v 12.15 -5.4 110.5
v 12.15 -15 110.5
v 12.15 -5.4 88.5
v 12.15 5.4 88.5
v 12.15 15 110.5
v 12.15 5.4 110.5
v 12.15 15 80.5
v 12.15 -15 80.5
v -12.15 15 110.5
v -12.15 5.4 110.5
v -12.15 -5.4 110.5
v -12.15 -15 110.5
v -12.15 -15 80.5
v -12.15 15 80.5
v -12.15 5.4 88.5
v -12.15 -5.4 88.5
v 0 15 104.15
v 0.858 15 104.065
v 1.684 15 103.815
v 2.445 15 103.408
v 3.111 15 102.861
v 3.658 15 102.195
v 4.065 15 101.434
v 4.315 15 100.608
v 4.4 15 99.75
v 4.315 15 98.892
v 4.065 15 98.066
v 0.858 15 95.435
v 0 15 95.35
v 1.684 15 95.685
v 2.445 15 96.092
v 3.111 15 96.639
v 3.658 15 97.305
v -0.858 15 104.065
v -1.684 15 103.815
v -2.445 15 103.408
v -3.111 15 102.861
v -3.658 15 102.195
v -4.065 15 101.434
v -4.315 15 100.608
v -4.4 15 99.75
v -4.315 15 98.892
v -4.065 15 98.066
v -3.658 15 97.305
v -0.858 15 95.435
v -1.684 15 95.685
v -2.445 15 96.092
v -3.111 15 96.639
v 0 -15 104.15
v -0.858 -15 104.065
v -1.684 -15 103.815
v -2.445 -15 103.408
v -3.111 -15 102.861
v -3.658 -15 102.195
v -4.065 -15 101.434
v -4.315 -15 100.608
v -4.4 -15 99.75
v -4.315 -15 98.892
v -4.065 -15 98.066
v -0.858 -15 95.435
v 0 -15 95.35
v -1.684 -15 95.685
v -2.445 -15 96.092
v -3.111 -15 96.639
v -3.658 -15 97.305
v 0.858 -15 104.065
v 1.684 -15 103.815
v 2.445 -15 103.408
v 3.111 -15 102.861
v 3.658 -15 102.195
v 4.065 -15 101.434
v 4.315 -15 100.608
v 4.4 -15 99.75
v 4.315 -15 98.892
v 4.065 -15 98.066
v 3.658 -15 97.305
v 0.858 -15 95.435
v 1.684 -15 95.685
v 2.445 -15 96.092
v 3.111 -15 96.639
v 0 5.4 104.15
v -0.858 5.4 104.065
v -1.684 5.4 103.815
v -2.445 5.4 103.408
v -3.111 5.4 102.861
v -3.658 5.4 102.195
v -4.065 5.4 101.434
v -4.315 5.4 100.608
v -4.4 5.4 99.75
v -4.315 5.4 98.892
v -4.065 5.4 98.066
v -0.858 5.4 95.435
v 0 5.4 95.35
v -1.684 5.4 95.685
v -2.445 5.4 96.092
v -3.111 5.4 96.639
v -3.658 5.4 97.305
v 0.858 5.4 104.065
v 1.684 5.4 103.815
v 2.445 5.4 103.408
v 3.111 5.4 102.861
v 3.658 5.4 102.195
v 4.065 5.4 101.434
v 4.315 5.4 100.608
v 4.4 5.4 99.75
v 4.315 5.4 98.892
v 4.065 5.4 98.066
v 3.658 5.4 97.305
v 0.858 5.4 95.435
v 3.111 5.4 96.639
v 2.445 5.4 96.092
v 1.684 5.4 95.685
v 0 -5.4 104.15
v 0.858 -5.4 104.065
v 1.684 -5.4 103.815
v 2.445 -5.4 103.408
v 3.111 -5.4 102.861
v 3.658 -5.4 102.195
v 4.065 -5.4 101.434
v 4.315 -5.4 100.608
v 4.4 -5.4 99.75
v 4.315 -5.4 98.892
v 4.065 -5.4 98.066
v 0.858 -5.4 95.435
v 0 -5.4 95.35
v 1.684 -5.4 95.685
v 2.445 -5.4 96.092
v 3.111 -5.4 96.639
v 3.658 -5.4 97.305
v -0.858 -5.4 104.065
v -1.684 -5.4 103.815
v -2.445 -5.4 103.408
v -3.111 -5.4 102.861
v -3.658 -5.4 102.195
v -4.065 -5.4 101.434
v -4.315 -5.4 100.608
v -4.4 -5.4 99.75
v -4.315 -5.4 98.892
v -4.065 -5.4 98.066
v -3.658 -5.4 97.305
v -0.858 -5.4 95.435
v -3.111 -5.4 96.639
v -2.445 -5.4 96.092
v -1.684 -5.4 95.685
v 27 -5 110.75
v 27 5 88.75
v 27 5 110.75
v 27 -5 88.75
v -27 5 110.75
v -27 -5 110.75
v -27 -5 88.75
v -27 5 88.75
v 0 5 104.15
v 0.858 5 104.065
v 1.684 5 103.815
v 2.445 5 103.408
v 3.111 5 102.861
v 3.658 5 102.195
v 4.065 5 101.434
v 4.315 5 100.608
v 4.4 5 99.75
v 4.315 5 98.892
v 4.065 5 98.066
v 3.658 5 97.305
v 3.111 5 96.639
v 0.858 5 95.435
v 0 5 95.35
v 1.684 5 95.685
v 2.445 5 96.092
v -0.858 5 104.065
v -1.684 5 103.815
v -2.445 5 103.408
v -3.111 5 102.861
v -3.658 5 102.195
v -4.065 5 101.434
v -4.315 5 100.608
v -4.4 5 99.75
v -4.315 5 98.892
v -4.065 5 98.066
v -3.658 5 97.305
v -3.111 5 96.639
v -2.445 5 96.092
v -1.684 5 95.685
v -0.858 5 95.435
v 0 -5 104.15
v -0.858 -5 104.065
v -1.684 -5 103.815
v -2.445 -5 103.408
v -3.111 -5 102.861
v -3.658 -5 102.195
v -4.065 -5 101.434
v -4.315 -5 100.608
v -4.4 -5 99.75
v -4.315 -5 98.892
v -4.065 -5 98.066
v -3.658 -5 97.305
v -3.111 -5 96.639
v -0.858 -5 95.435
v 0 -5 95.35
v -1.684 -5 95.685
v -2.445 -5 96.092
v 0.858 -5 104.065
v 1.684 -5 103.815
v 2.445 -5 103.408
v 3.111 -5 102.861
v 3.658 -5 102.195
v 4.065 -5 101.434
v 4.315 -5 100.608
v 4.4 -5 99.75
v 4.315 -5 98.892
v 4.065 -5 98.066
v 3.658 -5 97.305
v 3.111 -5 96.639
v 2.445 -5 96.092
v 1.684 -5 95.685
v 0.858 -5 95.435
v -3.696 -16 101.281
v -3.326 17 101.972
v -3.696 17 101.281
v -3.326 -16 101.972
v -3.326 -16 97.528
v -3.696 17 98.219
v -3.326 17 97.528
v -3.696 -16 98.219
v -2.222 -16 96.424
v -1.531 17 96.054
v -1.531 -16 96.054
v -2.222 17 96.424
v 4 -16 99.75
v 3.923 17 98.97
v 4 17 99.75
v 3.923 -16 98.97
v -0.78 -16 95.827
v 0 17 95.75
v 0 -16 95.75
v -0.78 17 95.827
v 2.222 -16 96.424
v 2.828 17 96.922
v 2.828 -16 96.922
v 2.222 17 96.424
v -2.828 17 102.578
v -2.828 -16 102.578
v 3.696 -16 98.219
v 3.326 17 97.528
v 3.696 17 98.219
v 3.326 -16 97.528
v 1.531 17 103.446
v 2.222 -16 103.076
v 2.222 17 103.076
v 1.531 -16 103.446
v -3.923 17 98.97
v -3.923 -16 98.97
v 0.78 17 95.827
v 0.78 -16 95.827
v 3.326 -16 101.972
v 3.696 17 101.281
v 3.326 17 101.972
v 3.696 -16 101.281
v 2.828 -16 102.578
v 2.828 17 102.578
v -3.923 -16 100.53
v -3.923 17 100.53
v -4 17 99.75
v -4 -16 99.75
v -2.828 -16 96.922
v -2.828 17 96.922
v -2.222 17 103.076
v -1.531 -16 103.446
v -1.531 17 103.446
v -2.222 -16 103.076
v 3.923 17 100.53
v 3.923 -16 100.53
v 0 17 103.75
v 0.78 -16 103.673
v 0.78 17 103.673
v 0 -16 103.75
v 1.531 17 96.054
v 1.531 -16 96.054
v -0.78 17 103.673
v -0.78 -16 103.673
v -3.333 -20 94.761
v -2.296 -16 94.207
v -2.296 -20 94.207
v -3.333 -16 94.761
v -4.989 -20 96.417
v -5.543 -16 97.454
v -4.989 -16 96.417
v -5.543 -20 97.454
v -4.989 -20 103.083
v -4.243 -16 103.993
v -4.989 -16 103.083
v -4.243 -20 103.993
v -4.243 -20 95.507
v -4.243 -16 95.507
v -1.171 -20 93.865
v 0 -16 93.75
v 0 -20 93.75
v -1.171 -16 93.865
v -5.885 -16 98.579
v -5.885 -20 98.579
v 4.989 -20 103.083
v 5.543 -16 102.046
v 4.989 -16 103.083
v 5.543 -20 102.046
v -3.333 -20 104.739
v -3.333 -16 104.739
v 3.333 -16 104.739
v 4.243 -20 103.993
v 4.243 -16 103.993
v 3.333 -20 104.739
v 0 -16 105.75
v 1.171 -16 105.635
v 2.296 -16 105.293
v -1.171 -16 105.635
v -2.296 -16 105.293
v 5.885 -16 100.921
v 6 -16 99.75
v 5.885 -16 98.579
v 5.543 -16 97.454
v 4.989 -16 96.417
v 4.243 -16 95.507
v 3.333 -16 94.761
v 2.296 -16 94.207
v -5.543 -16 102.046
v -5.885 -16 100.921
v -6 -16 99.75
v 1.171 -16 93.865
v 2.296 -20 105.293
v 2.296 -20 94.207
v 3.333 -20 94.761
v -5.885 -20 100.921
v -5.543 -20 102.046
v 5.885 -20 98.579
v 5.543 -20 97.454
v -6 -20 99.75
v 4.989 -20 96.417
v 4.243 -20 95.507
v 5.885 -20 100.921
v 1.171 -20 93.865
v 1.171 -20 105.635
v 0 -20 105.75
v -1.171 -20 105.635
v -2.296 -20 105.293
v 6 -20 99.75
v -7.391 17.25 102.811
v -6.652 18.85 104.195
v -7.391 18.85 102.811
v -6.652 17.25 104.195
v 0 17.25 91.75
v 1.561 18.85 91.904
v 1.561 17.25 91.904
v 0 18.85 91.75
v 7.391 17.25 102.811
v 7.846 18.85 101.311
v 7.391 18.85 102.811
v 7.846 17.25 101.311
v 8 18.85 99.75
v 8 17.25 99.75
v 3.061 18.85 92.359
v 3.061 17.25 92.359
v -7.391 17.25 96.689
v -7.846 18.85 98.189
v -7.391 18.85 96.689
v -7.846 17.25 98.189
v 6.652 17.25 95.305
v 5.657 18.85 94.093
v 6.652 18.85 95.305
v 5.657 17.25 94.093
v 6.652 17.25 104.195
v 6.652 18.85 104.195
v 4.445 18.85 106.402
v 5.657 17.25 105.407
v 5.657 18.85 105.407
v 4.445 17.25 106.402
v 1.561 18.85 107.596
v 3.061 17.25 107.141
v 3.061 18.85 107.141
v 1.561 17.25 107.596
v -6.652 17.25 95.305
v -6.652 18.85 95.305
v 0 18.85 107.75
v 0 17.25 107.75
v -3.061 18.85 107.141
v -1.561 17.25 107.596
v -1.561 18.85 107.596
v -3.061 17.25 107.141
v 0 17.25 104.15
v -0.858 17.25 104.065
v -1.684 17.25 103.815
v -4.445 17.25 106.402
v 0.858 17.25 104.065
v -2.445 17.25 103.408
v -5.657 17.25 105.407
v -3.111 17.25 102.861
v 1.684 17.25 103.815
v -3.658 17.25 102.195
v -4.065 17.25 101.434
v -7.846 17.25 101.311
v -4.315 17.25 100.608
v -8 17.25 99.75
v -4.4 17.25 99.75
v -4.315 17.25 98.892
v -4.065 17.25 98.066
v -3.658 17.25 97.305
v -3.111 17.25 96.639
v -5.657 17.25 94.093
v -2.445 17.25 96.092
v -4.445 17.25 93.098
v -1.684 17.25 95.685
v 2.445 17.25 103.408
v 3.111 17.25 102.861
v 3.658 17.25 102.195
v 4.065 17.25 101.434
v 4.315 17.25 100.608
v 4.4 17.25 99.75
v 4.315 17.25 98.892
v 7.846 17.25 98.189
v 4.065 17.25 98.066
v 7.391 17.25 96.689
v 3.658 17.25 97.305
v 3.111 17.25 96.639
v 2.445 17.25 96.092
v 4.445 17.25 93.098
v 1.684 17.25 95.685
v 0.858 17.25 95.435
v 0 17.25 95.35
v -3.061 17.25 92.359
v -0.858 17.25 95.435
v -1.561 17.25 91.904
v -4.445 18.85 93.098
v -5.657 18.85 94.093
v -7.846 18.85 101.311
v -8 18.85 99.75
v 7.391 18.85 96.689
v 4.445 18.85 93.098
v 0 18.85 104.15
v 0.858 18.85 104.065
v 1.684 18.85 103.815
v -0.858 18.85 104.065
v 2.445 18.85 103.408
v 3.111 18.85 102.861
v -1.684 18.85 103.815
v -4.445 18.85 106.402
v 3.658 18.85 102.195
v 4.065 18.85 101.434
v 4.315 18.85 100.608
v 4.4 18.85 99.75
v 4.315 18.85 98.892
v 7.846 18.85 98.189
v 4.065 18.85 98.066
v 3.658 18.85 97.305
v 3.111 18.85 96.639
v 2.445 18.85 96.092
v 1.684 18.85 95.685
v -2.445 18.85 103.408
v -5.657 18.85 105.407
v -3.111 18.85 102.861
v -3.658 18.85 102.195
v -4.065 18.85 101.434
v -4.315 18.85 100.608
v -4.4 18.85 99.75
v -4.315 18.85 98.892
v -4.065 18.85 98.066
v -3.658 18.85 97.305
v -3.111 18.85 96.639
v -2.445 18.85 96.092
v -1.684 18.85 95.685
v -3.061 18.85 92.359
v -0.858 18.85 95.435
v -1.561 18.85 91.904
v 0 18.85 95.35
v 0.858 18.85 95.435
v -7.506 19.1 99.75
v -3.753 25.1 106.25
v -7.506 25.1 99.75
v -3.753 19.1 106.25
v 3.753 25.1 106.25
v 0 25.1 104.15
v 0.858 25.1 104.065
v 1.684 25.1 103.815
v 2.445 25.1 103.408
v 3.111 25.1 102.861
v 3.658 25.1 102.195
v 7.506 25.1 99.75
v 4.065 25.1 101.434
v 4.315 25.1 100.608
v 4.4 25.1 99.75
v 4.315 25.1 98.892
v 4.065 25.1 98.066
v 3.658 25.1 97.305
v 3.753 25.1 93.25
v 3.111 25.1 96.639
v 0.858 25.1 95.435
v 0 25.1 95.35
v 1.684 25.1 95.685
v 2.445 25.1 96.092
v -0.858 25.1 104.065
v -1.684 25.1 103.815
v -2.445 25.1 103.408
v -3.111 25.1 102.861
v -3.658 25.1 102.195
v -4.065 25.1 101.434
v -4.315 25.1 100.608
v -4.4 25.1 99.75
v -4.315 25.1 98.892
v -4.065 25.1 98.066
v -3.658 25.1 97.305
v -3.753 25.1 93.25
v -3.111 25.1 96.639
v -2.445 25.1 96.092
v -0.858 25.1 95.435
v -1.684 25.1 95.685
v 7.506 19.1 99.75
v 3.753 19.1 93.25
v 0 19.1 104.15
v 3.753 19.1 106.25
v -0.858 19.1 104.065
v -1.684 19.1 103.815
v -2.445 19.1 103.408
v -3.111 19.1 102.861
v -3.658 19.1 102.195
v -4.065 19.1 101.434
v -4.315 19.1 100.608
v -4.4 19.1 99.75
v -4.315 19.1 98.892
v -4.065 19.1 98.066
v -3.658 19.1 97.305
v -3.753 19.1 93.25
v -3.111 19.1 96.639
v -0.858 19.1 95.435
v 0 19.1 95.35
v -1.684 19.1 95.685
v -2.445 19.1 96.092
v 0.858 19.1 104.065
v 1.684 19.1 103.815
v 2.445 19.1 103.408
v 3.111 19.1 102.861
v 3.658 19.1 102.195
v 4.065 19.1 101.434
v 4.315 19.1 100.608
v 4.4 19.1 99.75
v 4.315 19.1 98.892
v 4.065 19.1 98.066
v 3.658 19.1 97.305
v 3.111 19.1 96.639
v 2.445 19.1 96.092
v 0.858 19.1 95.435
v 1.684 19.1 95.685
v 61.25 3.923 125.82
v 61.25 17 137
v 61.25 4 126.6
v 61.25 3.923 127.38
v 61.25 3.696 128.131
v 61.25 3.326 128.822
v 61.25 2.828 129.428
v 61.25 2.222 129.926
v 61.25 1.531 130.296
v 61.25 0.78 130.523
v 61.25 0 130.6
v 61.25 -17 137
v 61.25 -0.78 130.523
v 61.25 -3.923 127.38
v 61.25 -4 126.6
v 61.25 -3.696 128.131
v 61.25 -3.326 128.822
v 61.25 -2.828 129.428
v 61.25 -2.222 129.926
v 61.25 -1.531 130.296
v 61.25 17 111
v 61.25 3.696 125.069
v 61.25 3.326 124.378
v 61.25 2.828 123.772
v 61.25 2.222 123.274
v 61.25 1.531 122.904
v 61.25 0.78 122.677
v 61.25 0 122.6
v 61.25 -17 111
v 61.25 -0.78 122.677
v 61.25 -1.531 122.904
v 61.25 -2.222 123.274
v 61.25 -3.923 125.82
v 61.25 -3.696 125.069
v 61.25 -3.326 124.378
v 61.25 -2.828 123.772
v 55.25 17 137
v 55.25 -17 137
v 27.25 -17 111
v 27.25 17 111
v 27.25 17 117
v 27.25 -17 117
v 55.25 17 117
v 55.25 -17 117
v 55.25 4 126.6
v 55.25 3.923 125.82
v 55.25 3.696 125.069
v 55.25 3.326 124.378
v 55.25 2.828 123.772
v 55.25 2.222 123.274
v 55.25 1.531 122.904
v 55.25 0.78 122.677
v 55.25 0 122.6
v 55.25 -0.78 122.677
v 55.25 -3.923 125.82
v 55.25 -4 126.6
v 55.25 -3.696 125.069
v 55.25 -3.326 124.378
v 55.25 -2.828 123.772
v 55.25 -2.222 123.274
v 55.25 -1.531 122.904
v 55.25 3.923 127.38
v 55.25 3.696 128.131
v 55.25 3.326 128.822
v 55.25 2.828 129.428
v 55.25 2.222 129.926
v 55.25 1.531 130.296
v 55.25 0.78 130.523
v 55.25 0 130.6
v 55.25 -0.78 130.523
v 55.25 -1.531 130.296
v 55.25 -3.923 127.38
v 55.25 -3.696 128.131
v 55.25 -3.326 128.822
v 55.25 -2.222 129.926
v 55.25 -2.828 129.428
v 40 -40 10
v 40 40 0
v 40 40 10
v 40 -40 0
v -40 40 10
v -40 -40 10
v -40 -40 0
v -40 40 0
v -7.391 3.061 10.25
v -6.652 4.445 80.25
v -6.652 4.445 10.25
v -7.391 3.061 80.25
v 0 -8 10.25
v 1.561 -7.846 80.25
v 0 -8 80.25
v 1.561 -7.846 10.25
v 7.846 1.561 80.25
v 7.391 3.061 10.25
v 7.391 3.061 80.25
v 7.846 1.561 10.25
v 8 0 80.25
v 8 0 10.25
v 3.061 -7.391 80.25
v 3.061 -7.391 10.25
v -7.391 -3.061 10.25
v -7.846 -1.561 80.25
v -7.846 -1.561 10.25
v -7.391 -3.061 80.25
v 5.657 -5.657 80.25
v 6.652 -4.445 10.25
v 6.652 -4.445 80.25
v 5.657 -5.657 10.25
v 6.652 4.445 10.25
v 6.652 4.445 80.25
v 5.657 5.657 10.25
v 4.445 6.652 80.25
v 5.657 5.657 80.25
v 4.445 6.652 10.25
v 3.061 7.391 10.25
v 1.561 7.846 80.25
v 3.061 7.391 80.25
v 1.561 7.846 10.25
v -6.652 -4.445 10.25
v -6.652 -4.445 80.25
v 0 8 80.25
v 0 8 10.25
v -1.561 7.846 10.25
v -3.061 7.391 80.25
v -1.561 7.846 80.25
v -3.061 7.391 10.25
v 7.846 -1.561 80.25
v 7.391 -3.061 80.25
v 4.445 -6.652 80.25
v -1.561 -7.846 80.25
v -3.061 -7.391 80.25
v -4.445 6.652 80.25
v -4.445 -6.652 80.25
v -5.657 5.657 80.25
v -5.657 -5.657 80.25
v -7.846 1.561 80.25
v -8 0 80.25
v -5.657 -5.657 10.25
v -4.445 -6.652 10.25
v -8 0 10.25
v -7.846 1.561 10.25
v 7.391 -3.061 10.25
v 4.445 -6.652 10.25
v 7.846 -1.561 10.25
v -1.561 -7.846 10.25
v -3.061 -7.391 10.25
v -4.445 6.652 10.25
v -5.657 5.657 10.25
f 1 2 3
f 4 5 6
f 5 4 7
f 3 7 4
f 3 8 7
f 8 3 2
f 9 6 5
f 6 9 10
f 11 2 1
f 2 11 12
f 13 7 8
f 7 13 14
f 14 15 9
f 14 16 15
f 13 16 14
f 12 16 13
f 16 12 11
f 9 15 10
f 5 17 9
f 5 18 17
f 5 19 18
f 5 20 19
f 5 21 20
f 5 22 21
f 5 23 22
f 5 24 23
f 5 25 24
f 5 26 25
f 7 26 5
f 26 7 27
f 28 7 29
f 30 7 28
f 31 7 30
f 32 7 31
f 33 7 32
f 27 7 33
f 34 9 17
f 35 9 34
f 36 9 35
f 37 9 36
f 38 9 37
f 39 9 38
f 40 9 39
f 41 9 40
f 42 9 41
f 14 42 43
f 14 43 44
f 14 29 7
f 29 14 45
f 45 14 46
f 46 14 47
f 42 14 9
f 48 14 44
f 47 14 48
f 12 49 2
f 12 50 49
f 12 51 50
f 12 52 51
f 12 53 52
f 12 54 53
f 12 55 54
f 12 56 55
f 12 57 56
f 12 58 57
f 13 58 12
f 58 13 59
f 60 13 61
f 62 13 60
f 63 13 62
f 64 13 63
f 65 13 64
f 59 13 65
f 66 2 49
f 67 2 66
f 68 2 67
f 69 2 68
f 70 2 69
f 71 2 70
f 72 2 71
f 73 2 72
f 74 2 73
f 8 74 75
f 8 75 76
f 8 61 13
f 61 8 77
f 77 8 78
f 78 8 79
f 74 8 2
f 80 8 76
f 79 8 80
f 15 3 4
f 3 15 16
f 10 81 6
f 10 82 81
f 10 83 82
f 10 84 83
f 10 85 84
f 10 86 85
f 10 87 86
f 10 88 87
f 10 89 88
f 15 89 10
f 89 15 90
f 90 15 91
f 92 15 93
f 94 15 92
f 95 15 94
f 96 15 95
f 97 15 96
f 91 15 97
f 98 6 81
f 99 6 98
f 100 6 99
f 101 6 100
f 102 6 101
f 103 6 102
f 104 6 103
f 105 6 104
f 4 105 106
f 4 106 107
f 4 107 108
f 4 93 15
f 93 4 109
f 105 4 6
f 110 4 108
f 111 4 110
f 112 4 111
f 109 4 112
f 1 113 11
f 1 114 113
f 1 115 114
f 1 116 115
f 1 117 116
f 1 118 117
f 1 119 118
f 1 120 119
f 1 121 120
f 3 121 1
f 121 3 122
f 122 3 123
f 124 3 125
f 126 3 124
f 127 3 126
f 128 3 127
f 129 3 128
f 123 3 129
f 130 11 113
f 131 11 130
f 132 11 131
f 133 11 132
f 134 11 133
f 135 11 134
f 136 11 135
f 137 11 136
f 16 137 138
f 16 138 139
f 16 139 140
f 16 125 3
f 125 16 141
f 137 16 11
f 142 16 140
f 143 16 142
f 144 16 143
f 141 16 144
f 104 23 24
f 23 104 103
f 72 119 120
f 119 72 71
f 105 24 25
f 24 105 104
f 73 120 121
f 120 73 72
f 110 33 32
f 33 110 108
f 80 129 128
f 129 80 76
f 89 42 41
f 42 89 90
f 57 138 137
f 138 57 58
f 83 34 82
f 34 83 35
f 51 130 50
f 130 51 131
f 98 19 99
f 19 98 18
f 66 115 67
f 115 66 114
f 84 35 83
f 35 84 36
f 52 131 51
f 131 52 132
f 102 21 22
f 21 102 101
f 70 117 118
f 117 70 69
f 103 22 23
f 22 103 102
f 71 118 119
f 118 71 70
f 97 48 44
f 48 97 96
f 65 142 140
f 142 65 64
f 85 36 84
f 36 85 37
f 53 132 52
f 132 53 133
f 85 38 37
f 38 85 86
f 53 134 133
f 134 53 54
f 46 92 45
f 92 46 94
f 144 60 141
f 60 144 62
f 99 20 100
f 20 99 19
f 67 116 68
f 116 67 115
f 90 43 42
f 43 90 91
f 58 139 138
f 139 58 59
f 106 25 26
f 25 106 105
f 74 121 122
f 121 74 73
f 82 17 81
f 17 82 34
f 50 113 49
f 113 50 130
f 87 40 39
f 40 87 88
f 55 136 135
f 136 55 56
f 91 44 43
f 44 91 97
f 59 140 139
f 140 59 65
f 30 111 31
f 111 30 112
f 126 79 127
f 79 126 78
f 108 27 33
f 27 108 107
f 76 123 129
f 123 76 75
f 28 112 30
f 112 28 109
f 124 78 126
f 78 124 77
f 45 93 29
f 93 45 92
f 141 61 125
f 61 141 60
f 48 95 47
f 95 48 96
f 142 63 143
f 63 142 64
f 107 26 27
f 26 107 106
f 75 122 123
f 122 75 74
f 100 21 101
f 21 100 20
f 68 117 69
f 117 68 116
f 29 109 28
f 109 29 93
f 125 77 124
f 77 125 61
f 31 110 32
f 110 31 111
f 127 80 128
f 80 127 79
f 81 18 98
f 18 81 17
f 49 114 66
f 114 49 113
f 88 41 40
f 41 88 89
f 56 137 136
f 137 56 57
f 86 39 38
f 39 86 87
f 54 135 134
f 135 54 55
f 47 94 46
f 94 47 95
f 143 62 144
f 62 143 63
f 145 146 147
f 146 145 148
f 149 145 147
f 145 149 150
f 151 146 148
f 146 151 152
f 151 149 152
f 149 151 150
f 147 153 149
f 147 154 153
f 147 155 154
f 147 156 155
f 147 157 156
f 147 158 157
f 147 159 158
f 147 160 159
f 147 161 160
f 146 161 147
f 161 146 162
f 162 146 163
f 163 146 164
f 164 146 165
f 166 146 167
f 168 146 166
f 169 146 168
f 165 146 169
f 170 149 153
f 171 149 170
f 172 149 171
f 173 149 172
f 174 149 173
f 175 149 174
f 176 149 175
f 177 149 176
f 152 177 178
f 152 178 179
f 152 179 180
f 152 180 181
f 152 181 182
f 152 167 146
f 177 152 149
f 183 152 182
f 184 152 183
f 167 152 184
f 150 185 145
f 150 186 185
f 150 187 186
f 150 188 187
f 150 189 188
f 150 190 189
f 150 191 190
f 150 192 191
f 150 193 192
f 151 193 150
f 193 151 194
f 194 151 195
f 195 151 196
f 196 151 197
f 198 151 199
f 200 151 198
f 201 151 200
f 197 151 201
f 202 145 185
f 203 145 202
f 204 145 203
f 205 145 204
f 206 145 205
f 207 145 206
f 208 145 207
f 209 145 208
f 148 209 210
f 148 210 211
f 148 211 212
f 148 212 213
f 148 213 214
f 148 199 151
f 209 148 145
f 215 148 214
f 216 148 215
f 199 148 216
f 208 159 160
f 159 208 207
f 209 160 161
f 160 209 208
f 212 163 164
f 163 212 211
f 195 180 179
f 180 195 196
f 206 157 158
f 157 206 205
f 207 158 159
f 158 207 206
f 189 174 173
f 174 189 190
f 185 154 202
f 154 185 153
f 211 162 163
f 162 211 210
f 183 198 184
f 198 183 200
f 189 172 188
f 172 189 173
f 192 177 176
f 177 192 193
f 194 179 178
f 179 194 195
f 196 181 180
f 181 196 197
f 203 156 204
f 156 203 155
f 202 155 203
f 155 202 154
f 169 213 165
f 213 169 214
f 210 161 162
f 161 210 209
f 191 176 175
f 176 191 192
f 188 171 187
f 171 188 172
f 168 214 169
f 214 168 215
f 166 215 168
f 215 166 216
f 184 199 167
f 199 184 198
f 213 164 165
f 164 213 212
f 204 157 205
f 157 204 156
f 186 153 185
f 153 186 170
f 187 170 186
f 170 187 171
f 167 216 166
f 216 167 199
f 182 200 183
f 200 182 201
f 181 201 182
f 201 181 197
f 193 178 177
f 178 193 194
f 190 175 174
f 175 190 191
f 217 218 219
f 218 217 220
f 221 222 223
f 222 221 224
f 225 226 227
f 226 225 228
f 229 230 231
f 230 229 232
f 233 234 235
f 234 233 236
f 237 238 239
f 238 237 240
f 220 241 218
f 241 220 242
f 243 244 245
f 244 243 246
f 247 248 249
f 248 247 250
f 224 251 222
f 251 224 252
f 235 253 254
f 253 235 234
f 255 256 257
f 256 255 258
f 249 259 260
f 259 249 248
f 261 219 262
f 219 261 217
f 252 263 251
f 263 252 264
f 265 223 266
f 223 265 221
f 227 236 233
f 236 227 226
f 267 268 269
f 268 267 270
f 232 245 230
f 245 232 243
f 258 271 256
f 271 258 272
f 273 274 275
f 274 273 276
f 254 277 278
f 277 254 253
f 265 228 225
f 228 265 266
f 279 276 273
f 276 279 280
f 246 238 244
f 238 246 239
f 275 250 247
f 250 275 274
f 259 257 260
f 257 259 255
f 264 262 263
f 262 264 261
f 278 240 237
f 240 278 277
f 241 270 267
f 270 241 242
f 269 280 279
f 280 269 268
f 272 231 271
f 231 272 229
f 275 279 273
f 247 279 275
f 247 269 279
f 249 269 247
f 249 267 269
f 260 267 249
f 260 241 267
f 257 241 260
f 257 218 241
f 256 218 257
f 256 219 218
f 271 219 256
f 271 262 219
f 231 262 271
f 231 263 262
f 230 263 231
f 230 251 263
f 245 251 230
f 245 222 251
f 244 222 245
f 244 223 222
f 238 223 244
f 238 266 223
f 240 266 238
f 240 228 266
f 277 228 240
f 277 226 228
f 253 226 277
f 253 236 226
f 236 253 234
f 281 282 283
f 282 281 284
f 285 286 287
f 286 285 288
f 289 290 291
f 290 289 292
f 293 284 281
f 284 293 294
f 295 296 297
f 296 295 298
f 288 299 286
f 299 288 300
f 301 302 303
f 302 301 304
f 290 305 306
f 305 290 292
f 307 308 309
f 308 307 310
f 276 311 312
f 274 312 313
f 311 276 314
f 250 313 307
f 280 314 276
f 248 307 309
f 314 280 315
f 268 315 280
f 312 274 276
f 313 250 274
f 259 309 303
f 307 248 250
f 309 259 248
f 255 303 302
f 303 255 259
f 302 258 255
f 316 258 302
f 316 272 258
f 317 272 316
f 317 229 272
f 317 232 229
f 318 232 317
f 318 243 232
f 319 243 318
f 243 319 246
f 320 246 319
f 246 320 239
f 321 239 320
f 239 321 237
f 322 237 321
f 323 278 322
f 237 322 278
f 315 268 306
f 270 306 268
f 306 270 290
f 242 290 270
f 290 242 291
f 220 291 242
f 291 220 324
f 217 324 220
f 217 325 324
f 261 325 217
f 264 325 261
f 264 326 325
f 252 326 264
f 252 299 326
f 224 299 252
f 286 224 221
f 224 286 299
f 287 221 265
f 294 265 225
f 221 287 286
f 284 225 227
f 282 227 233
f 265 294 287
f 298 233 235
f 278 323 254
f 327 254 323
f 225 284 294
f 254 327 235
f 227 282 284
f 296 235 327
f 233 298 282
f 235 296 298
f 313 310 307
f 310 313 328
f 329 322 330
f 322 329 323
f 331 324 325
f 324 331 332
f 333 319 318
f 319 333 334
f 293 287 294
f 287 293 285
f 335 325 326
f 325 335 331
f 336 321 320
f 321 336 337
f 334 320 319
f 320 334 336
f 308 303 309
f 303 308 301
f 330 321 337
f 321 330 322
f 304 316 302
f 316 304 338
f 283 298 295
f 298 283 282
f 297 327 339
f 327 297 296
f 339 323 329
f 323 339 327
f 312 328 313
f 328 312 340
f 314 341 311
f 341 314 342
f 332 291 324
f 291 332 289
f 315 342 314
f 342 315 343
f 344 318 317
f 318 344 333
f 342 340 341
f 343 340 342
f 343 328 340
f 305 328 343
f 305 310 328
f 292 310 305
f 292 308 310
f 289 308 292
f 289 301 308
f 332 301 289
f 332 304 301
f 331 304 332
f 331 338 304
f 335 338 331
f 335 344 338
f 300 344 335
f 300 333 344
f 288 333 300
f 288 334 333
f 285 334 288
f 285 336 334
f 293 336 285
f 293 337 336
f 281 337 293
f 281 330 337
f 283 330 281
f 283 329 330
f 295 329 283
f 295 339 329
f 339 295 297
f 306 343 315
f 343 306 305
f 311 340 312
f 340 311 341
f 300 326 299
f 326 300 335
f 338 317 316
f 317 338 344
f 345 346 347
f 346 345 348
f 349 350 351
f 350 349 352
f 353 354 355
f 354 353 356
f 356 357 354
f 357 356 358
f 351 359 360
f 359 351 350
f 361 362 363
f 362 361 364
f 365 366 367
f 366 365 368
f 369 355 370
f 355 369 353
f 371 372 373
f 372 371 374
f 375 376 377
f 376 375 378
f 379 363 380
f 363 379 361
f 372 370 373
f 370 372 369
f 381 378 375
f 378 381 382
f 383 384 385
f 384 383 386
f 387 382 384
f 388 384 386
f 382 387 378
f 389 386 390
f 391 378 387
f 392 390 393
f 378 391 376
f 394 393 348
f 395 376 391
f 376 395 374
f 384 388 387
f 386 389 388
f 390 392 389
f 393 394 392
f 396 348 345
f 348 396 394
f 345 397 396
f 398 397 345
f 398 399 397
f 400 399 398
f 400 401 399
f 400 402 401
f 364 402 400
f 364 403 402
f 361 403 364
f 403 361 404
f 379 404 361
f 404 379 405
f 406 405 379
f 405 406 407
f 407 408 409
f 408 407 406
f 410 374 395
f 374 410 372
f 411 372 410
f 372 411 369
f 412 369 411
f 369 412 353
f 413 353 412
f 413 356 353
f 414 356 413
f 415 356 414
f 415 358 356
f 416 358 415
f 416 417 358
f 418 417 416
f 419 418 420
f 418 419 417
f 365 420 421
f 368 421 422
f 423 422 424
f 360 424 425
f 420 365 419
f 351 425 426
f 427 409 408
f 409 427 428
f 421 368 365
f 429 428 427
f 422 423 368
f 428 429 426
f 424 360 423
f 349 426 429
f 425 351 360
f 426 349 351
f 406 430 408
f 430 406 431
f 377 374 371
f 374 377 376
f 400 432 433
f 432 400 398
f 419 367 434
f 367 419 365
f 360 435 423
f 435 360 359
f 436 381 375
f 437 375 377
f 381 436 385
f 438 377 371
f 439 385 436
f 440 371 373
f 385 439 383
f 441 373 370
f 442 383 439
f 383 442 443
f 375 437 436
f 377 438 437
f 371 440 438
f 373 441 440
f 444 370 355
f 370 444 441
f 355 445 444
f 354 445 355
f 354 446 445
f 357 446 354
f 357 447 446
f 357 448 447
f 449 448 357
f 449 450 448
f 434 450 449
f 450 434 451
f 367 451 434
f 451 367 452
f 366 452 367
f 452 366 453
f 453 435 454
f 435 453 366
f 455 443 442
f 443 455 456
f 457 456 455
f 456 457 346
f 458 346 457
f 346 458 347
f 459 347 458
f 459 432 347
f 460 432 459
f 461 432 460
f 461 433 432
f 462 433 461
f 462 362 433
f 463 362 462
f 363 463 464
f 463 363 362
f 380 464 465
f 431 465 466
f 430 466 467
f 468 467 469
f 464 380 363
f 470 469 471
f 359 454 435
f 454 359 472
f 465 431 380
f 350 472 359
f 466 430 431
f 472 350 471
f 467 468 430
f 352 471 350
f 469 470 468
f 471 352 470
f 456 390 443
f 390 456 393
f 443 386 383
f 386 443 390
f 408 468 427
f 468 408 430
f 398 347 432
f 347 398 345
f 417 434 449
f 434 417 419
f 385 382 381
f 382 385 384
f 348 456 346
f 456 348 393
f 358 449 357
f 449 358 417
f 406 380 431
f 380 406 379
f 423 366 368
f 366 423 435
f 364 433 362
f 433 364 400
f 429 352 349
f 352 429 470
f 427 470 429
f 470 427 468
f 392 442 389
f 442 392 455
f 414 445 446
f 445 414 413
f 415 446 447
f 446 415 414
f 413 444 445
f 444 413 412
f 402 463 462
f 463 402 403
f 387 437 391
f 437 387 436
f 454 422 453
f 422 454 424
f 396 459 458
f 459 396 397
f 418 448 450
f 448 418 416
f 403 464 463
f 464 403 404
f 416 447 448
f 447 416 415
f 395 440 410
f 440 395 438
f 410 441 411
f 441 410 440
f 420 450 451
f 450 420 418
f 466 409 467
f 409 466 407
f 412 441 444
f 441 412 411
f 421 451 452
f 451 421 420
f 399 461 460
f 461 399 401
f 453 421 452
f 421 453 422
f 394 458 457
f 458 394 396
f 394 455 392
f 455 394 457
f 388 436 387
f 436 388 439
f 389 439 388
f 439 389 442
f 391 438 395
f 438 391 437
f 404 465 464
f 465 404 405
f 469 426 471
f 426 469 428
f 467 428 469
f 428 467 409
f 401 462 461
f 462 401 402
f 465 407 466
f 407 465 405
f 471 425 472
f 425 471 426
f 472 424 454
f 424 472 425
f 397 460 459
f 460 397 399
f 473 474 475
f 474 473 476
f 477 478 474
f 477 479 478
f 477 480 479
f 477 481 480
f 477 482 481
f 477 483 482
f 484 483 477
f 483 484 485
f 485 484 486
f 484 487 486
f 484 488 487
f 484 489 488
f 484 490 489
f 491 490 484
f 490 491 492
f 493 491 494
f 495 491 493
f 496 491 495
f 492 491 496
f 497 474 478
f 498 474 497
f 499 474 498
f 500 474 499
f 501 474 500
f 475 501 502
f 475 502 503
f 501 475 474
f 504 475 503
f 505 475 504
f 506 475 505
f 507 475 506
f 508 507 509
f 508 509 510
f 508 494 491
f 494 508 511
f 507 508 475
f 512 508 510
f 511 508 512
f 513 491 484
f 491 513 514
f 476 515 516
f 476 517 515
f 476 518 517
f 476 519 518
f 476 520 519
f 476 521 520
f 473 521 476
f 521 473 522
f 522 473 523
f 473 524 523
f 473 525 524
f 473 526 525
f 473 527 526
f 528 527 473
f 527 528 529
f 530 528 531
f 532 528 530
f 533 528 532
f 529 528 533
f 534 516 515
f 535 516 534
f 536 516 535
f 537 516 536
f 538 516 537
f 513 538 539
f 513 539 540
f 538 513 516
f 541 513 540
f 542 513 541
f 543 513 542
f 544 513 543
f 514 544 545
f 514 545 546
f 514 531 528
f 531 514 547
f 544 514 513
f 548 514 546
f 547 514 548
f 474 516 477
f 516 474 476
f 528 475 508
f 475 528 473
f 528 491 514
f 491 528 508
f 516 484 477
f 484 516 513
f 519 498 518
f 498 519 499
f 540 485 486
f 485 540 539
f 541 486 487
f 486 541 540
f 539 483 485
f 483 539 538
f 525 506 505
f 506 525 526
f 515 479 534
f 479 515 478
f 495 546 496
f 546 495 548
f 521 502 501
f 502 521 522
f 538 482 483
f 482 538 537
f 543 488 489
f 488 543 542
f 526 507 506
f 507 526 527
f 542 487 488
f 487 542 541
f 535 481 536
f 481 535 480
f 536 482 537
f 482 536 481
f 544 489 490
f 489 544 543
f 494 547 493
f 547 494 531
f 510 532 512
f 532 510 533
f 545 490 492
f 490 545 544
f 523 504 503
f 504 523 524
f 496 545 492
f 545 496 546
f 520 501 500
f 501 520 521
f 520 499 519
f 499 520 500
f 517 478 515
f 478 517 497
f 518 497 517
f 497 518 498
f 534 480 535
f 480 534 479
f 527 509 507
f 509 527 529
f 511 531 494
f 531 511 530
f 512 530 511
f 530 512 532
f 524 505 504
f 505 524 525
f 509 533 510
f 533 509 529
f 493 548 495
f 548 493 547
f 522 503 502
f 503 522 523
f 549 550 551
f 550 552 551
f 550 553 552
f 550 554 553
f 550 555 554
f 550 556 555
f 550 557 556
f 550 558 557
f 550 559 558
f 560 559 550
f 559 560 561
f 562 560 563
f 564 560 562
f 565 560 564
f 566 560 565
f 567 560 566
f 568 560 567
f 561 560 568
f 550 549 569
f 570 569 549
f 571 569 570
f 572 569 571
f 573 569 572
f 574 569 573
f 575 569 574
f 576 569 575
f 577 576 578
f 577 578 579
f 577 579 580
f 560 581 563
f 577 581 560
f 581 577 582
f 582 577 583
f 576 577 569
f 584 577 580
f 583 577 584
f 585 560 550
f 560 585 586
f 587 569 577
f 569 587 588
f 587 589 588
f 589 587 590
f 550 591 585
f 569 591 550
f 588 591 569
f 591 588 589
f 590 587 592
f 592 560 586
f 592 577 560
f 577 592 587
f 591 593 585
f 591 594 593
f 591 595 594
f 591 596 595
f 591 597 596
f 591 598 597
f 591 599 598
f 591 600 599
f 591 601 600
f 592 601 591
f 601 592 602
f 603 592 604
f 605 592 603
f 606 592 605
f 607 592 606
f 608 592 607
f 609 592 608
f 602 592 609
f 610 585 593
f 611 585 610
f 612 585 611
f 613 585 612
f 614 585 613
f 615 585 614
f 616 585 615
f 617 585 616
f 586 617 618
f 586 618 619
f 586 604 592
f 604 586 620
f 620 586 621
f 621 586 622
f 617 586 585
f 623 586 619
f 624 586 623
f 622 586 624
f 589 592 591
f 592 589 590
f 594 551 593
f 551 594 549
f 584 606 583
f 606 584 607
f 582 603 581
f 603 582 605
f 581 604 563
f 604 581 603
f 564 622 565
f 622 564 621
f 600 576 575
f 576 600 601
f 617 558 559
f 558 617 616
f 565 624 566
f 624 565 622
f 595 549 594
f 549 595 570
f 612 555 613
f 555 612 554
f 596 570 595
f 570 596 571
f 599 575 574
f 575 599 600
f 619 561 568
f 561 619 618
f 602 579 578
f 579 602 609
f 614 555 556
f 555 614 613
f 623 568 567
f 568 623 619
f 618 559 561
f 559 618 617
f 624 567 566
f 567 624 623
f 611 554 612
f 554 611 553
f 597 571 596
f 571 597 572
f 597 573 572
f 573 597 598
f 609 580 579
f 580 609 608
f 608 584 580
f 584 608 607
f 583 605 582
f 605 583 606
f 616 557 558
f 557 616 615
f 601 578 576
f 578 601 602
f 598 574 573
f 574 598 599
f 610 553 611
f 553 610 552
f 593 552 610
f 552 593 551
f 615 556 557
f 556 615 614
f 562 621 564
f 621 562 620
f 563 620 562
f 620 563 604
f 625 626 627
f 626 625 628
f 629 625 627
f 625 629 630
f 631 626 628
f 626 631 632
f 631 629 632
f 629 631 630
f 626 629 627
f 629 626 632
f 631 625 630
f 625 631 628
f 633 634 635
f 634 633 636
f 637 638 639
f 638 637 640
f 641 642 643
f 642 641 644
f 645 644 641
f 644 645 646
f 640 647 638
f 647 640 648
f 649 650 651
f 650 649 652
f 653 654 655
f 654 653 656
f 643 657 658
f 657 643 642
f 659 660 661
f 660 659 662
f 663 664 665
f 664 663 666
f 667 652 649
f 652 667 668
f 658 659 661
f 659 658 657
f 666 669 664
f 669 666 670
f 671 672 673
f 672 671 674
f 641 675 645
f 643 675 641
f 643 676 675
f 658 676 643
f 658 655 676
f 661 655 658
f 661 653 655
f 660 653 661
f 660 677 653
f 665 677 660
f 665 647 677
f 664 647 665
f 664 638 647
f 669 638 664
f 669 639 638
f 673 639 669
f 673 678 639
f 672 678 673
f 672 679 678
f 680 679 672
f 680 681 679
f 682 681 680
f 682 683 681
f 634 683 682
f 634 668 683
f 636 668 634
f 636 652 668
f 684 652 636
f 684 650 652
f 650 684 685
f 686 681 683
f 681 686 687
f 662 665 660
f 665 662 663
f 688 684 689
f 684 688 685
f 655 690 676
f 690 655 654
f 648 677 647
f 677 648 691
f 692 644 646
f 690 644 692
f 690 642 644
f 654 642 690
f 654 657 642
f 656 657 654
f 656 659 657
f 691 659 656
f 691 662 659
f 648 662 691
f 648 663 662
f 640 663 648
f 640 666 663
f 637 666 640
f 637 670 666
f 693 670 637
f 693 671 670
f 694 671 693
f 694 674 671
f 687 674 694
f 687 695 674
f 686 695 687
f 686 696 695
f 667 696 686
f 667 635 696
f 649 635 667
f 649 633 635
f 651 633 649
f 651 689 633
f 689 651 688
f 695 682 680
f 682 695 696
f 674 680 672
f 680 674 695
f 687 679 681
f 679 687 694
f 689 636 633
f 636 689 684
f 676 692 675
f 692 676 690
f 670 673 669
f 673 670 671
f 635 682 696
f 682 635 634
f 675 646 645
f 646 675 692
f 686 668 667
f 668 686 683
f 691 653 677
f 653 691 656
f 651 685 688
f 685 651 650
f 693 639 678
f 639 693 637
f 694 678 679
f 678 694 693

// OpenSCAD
$fn = 32;

// ------------------------------------------------------------------------
// Lamp arm: column d16 x 70 mm, arm 54 mm
// Every part is its own module, assembly() places every instance.
// ------------------------------------------------------------------------

// --- part 1 ---
module lamp_base() {
  difference() {
    translate([-40, -40, 0]) cube([80, 80, 10]);
  }
}

// --- part 2 ---
module lamp_column() {
  cylinder(h = 70, d = 16);
}

// --- part 3 ---
module head_fork() {
  difference() {
    translate([-12.15, -15, 0]) cube([24.3, 30, 30]);
    translate([-13.15, -5.4, 8]) cube([26.3, 10.8, 23]);
    translate([0, 0, 19.25]) rotate([90, 0, 0]) cylinder(h = 32, d = 8.8, center = true);
  }
}

// --- part 4 ---
module lamp_arm() {
  difference() {
    translate([-27, -5, 0]) cube([54, 10, 22]);
    translate([0, 0, 11]) rotate([90, 0, 0]) cylinder(h = 12, d = 8.8, center = true);
  }
}

// --- part 5 ---
module arm_pin() {
  rotate([0, 90, 0]) cylinder(h = 34, d = 8, center = true);
  translate([-20, 0, 0]) rotate([0, 90, 0]) cylinder(h = 4, d = 12);
}

// --- part 6 ---
module arm_washer() {
  difference() {
      translate([0, 0, 0]) cylinder(h = 1.6, d = 16);
      translate([0, 0, -1]) cylinder(h = 3.6, d = 8.8);
    }
}

// --- part 7 ---
module arm_nut() {
  difference() {
    linear_extrude(height = 6) polygon(points = [[7.506, 0], [3.753, 6.5], [-3.753, 6.5], [-7.506, 0], [-3.753, -6.5], [3.753, -6.5]]);
    translate([0, 0, -1]) cylinder(h = 8, d = 8.8);
  }
}

// --- part 8 ---
module shade_bracket() {
  difference() {
    translate([-17, -17, 0]) cube([34, 34, 26]);
    translate([-18, -18, 6]) cube([29, 36, 21]);
    translate([14, 0, 15.6]) rotate([0, 90, 0]) cylinder(h = 8, d = 8, center = true);
  }
}

// --- assembly ---
module assembly() {
  color([0.80, 0.24, 0.20]) translate([0, 0, 0]) rotate([0, 0, 0]) lamp_base();
  color([0.20, 0.45, 0.75]) translate([0, 0, 10.25]) rotate([0, 0, 0]) lamp_column();
  color([0.25, 0.62, 0.32]) translate([0, 0, 80.5]) rotate([0, 0, 0]) head_fork();
  color([0.92, 0.70, 0.18]) translate([0, 0, 88.75]) rotate([0, 0, 0]) lamp_arm();
  color([0.58, 0.35, 0.70]) translate([0, 0, 99.75]) rotate([0, 0, 90]) arm_pin();
  color([0.16, 0.66, 0.66]) translate([0, 18.85, 99.75]) rotate([90, 0, 0]) arm_washer();
  color([0.85, 0.48, 0.18]) translate([0, 25.1, 99.75]) rotate([90, 0, 0]) arm_nut();
  color([0.55, 0.60, 0.65]) translate([44.25, 0, 111]) rotate([0, 0, 0]) shade_bracket();
}

assembly();
